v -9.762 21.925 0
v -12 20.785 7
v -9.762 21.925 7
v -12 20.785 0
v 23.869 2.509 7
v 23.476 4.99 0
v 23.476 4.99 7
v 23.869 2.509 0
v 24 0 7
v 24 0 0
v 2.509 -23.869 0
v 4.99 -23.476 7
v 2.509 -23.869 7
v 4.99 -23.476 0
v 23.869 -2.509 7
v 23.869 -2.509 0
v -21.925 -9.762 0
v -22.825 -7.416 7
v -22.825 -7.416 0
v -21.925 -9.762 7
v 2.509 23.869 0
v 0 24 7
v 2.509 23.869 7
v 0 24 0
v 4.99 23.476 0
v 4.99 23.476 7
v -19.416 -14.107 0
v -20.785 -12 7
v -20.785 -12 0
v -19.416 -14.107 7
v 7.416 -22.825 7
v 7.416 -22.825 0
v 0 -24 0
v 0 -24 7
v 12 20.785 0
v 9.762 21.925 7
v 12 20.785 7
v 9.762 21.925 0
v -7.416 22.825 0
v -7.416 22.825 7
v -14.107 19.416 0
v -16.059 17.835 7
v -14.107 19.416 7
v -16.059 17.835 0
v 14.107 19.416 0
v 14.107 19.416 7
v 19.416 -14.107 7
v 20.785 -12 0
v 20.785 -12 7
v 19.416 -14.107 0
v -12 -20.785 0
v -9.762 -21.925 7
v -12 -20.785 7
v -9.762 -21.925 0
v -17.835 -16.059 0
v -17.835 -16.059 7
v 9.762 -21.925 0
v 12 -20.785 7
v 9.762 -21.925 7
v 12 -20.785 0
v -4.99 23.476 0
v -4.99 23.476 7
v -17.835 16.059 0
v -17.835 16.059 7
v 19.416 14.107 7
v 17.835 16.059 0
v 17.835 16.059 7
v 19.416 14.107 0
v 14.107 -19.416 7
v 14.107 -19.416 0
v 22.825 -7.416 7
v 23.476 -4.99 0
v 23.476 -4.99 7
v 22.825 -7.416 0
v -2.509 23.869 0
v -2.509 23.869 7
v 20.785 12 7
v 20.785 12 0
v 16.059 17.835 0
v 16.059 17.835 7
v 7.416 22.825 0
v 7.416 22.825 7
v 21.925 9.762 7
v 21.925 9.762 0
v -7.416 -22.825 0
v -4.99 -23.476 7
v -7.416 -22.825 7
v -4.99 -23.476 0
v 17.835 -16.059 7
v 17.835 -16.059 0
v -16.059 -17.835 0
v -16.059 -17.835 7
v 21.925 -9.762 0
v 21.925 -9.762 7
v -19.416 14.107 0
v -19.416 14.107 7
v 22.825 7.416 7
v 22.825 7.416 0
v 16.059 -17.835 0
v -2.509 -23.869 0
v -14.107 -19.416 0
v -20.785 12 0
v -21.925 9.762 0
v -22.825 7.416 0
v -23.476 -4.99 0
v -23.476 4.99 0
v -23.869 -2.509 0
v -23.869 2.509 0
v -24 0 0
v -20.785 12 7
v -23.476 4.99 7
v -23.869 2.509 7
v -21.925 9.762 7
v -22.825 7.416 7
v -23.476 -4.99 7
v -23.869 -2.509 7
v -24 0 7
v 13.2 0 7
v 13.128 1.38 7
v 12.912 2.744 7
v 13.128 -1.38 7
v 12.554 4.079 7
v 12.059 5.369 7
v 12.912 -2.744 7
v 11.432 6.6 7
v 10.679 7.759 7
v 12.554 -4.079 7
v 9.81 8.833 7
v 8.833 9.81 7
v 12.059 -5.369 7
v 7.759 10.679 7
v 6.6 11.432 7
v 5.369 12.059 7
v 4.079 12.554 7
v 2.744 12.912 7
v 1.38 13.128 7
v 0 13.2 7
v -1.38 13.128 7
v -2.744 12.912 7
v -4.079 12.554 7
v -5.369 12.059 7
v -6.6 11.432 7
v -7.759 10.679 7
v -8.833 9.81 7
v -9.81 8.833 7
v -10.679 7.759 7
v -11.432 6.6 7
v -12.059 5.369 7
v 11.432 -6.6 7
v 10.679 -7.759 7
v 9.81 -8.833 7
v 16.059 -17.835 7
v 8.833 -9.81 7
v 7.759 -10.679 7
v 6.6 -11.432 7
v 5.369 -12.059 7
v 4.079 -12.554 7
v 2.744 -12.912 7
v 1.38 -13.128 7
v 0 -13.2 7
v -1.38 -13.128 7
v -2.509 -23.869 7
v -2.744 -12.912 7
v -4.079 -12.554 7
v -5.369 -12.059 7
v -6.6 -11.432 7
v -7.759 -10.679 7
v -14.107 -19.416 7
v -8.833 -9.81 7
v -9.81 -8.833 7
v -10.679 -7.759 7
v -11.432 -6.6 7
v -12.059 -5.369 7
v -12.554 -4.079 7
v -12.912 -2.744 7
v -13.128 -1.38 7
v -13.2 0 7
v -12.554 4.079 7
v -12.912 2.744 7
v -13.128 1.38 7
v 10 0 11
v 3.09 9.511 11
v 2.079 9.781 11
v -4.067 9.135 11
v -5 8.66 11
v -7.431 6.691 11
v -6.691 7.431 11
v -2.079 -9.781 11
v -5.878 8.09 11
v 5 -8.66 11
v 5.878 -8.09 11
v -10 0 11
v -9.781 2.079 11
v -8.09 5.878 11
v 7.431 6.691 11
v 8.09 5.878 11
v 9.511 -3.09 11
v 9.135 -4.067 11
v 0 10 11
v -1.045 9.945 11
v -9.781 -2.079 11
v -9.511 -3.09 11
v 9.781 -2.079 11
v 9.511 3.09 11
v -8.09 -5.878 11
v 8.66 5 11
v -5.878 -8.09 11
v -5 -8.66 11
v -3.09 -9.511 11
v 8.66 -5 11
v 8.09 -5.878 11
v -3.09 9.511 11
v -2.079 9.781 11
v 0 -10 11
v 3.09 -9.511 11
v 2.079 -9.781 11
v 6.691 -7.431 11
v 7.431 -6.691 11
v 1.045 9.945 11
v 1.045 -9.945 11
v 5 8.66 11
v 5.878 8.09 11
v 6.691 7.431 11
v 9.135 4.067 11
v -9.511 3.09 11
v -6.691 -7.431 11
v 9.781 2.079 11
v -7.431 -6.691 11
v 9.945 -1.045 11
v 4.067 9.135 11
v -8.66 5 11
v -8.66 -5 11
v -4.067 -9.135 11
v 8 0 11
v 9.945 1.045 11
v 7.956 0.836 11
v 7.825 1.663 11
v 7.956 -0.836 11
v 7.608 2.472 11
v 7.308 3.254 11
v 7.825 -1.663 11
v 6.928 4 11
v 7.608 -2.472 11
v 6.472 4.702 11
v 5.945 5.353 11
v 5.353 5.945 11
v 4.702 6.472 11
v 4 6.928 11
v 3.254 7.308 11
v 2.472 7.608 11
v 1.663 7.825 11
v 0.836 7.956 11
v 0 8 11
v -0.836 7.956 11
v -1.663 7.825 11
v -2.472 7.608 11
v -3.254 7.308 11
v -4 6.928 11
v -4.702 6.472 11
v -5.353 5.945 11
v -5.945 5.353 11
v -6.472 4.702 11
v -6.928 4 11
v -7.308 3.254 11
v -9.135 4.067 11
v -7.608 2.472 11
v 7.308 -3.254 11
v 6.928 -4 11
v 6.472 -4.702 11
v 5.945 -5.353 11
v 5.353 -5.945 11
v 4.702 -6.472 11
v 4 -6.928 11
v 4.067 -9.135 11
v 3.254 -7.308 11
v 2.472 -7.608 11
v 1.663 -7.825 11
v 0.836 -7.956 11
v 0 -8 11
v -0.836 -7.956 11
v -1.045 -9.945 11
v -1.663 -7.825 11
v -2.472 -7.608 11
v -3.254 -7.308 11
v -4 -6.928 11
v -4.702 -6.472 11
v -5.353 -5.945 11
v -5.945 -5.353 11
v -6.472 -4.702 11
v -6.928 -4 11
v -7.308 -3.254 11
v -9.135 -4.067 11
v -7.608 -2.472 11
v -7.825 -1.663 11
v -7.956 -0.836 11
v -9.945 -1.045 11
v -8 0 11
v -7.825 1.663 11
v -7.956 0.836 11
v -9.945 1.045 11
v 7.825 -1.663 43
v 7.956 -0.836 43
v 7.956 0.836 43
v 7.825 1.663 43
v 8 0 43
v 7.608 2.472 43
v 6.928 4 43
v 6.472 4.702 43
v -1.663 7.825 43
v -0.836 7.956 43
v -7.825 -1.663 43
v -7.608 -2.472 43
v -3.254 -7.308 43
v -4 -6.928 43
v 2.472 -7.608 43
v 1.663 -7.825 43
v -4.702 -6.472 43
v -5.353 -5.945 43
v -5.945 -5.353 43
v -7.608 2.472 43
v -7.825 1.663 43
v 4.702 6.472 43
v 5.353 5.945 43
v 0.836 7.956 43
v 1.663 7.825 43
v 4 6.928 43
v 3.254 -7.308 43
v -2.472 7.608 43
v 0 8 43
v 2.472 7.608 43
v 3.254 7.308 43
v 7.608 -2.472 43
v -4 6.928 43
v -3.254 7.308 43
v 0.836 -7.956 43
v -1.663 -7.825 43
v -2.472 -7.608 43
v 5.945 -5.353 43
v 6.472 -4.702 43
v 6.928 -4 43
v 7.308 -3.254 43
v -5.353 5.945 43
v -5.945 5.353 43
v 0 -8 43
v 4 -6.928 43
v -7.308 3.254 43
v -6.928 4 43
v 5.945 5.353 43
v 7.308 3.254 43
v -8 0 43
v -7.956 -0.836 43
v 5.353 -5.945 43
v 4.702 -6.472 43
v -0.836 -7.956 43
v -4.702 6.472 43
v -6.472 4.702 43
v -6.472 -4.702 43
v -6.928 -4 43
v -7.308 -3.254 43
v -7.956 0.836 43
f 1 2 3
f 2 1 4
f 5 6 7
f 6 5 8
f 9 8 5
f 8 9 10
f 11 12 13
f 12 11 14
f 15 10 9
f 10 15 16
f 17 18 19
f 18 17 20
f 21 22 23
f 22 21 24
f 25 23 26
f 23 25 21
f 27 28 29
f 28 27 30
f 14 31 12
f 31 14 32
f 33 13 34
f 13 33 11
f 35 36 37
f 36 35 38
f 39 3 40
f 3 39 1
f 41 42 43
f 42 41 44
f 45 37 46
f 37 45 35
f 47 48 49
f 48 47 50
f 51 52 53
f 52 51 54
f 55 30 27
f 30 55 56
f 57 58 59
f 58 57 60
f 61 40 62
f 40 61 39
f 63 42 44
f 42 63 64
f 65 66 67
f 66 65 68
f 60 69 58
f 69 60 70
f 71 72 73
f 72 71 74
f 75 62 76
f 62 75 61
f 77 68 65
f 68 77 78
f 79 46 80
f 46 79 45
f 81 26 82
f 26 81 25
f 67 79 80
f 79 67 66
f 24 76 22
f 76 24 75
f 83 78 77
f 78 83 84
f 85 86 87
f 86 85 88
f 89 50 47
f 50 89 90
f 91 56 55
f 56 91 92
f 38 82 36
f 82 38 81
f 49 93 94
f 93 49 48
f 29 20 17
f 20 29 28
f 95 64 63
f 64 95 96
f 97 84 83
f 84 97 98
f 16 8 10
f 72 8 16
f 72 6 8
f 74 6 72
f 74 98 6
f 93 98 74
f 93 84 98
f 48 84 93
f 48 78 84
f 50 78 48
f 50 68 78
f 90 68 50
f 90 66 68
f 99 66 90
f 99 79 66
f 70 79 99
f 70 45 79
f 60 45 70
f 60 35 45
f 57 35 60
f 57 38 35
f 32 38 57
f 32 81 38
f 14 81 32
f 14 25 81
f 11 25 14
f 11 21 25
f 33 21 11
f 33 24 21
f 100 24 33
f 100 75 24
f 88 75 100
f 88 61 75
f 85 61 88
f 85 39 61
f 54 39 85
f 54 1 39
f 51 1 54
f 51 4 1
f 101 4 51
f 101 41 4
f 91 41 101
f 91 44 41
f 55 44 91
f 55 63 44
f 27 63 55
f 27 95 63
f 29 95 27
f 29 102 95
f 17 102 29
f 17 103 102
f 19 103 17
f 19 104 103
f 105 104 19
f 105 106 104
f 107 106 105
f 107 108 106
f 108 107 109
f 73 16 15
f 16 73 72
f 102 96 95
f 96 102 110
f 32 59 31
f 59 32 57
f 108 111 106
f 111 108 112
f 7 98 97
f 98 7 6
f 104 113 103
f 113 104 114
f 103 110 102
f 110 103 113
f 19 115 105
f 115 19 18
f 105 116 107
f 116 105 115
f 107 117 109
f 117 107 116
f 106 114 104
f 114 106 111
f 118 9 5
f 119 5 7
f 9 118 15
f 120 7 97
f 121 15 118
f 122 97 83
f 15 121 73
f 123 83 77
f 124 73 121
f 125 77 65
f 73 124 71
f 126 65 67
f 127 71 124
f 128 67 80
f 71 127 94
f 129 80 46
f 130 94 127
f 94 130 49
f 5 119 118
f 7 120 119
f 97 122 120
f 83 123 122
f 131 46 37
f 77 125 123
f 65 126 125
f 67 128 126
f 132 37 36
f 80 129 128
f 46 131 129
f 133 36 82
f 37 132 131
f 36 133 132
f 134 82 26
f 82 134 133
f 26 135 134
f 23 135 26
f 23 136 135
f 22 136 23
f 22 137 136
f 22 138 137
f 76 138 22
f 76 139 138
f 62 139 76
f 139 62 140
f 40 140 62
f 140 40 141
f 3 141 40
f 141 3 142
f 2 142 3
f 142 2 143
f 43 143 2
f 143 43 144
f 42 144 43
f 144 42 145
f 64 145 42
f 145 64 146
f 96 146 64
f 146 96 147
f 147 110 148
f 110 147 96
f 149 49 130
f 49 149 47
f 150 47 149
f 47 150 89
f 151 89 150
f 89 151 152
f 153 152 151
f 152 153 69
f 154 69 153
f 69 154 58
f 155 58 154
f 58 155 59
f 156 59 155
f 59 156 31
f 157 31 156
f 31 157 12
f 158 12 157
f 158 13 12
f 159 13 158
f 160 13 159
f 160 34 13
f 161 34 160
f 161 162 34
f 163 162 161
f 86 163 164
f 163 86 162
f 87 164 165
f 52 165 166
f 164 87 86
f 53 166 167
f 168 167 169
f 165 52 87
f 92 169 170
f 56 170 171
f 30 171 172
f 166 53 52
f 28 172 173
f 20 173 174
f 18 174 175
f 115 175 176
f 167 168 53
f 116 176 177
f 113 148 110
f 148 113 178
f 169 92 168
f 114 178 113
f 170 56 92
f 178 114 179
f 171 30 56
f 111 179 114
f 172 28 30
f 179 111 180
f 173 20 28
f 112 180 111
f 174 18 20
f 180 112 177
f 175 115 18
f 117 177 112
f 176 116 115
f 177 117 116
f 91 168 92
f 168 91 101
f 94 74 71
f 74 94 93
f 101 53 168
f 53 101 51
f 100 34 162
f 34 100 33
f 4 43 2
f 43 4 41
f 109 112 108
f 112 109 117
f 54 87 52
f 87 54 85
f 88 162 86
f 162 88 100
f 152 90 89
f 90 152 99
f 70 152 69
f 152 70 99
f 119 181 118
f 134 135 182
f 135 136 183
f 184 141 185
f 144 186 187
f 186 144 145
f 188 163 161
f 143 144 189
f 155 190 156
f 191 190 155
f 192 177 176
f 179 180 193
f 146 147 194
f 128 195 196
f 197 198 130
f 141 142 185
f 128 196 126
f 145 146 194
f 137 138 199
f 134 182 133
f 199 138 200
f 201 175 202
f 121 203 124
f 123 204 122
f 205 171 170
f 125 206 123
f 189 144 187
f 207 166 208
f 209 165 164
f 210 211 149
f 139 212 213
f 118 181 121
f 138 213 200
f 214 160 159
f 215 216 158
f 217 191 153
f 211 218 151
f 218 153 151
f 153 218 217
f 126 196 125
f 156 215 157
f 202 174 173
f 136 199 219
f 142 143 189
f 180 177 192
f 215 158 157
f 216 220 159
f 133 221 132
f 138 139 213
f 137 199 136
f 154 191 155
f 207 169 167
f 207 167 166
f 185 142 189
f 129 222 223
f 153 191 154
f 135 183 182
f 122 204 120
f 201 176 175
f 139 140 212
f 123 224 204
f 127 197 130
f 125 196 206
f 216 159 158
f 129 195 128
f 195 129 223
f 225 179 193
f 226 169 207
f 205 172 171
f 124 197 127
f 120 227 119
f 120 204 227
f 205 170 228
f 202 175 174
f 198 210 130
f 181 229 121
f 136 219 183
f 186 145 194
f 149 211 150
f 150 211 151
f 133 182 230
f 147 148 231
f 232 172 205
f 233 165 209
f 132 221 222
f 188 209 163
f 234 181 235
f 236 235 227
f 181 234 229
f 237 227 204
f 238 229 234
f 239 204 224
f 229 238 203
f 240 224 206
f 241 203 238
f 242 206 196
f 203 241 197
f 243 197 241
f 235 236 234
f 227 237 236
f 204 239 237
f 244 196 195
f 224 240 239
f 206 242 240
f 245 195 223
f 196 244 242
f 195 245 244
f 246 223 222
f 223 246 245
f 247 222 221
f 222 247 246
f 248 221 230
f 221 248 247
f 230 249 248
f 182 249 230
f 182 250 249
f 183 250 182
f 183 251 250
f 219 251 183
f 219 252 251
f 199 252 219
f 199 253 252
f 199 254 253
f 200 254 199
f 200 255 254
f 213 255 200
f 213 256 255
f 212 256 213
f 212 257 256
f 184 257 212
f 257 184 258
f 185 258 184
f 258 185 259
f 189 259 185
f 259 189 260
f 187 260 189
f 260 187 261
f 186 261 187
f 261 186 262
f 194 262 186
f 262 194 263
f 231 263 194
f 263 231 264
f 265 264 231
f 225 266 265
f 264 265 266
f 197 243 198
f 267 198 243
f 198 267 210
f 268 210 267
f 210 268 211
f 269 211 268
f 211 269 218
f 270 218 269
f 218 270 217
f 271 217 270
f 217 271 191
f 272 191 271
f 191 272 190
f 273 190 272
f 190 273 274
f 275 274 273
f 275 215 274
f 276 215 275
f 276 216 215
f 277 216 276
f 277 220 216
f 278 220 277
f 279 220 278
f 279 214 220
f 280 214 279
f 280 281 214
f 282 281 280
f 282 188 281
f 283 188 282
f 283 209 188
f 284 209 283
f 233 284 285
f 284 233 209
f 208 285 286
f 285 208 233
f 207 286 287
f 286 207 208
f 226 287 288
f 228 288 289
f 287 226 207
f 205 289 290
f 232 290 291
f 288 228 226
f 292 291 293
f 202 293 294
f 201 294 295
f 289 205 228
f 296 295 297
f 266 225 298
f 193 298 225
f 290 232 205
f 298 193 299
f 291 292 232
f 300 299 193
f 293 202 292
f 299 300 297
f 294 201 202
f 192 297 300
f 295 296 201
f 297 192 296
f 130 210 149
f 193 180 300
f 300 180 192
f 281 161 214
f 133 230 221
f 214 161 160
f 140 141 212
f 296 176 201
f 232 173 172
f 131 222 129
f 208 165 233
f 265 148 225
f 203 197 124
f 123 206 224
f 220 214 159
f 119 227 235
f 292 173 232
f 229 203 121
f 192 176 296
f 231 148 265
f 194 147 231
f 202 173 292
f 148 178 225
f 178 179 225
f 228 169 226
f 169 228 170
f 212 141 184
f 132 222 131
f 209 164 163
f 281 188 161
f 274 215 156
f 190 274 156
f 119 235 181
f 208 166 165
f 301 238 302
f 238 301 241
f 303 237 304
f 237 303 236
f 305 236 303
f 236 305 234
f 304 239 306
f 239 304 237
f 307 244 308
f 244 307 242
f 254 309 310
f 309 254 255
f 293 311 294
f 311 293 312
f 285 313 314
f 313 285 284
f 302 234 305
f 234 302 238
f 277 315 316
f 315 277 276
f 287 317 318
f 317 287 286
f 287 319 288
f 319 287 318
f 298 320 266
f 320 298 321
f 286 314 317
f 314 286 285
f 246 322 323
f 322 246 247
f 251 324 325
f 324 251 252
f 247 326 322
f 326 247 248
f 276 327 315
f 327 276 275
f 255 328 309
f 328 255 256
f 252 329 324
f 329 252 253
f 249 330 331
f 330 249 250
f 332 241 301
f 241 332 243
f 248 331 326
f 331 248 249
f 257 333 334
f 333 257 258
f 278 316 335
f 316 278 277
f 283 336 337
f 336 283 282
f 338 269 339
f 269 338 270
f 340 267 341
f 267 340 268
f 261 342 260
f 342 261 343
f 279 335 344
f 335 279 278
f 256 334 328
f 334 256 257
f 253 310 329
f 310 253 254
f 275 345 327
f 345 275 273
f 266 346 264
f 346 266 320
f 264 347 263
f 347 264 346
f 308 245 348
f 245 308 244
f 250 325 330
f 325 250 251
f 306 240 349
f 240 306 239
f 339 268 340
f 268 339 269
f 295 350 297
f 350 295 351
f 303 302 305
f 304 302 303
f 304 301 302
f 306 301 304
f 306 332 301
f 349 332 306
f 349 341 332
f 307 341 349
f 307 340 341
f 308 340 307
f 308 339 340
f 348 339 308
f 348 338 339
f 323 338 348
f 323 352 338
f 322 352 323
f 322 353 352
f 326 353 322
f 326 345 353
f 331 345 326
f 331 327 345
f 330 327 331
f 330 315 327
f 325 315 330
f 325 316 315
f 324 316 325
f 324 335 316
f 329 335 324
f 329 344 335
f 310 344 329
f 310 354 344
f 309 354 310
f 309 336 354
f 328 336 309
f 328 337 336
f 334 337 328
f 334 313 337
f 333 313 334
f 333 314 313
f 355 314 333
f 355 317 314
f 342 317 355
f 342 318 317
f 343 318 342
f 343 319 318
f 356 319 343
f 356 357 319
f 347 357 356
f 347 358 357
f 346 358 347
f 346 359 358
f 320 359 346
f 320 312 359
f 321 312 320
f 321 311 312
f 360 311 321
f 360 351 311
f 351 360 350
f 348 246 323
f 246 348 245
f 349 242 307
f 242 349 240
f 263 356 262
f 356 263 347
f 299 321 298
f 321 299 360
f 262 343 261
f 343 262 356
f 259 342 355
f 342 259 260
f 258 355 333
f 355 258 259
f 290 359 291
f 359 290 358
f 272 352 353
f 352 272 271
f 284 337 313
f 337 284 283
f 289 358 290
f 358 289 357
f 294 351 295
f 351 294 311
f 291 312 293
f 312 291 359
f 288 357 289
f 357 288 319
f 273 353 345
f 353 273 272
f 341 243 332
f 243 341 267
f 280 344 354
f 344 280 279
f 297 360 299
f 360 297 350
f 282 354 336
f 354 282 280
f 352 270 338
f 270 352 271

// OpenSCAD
// Adjustable leveling foot, smooth threaded-shaft representation.
$fn = 60;
eps = 0.02;
shaft_d = 16;
pad_d = 48;
shaft_l = 32;
pad_h = 7;
union() {
    cylinder(d = pad_d, h = pad_h);
    translate([0, 0, pad_h]) cylinder(d1 = pad_d * 0.55, d2 = shaft_d + 4, h = 4);
    translate([0, 0, pad_h + 4]) cylinder(d = shaft_d, h = shaft_l);
}
